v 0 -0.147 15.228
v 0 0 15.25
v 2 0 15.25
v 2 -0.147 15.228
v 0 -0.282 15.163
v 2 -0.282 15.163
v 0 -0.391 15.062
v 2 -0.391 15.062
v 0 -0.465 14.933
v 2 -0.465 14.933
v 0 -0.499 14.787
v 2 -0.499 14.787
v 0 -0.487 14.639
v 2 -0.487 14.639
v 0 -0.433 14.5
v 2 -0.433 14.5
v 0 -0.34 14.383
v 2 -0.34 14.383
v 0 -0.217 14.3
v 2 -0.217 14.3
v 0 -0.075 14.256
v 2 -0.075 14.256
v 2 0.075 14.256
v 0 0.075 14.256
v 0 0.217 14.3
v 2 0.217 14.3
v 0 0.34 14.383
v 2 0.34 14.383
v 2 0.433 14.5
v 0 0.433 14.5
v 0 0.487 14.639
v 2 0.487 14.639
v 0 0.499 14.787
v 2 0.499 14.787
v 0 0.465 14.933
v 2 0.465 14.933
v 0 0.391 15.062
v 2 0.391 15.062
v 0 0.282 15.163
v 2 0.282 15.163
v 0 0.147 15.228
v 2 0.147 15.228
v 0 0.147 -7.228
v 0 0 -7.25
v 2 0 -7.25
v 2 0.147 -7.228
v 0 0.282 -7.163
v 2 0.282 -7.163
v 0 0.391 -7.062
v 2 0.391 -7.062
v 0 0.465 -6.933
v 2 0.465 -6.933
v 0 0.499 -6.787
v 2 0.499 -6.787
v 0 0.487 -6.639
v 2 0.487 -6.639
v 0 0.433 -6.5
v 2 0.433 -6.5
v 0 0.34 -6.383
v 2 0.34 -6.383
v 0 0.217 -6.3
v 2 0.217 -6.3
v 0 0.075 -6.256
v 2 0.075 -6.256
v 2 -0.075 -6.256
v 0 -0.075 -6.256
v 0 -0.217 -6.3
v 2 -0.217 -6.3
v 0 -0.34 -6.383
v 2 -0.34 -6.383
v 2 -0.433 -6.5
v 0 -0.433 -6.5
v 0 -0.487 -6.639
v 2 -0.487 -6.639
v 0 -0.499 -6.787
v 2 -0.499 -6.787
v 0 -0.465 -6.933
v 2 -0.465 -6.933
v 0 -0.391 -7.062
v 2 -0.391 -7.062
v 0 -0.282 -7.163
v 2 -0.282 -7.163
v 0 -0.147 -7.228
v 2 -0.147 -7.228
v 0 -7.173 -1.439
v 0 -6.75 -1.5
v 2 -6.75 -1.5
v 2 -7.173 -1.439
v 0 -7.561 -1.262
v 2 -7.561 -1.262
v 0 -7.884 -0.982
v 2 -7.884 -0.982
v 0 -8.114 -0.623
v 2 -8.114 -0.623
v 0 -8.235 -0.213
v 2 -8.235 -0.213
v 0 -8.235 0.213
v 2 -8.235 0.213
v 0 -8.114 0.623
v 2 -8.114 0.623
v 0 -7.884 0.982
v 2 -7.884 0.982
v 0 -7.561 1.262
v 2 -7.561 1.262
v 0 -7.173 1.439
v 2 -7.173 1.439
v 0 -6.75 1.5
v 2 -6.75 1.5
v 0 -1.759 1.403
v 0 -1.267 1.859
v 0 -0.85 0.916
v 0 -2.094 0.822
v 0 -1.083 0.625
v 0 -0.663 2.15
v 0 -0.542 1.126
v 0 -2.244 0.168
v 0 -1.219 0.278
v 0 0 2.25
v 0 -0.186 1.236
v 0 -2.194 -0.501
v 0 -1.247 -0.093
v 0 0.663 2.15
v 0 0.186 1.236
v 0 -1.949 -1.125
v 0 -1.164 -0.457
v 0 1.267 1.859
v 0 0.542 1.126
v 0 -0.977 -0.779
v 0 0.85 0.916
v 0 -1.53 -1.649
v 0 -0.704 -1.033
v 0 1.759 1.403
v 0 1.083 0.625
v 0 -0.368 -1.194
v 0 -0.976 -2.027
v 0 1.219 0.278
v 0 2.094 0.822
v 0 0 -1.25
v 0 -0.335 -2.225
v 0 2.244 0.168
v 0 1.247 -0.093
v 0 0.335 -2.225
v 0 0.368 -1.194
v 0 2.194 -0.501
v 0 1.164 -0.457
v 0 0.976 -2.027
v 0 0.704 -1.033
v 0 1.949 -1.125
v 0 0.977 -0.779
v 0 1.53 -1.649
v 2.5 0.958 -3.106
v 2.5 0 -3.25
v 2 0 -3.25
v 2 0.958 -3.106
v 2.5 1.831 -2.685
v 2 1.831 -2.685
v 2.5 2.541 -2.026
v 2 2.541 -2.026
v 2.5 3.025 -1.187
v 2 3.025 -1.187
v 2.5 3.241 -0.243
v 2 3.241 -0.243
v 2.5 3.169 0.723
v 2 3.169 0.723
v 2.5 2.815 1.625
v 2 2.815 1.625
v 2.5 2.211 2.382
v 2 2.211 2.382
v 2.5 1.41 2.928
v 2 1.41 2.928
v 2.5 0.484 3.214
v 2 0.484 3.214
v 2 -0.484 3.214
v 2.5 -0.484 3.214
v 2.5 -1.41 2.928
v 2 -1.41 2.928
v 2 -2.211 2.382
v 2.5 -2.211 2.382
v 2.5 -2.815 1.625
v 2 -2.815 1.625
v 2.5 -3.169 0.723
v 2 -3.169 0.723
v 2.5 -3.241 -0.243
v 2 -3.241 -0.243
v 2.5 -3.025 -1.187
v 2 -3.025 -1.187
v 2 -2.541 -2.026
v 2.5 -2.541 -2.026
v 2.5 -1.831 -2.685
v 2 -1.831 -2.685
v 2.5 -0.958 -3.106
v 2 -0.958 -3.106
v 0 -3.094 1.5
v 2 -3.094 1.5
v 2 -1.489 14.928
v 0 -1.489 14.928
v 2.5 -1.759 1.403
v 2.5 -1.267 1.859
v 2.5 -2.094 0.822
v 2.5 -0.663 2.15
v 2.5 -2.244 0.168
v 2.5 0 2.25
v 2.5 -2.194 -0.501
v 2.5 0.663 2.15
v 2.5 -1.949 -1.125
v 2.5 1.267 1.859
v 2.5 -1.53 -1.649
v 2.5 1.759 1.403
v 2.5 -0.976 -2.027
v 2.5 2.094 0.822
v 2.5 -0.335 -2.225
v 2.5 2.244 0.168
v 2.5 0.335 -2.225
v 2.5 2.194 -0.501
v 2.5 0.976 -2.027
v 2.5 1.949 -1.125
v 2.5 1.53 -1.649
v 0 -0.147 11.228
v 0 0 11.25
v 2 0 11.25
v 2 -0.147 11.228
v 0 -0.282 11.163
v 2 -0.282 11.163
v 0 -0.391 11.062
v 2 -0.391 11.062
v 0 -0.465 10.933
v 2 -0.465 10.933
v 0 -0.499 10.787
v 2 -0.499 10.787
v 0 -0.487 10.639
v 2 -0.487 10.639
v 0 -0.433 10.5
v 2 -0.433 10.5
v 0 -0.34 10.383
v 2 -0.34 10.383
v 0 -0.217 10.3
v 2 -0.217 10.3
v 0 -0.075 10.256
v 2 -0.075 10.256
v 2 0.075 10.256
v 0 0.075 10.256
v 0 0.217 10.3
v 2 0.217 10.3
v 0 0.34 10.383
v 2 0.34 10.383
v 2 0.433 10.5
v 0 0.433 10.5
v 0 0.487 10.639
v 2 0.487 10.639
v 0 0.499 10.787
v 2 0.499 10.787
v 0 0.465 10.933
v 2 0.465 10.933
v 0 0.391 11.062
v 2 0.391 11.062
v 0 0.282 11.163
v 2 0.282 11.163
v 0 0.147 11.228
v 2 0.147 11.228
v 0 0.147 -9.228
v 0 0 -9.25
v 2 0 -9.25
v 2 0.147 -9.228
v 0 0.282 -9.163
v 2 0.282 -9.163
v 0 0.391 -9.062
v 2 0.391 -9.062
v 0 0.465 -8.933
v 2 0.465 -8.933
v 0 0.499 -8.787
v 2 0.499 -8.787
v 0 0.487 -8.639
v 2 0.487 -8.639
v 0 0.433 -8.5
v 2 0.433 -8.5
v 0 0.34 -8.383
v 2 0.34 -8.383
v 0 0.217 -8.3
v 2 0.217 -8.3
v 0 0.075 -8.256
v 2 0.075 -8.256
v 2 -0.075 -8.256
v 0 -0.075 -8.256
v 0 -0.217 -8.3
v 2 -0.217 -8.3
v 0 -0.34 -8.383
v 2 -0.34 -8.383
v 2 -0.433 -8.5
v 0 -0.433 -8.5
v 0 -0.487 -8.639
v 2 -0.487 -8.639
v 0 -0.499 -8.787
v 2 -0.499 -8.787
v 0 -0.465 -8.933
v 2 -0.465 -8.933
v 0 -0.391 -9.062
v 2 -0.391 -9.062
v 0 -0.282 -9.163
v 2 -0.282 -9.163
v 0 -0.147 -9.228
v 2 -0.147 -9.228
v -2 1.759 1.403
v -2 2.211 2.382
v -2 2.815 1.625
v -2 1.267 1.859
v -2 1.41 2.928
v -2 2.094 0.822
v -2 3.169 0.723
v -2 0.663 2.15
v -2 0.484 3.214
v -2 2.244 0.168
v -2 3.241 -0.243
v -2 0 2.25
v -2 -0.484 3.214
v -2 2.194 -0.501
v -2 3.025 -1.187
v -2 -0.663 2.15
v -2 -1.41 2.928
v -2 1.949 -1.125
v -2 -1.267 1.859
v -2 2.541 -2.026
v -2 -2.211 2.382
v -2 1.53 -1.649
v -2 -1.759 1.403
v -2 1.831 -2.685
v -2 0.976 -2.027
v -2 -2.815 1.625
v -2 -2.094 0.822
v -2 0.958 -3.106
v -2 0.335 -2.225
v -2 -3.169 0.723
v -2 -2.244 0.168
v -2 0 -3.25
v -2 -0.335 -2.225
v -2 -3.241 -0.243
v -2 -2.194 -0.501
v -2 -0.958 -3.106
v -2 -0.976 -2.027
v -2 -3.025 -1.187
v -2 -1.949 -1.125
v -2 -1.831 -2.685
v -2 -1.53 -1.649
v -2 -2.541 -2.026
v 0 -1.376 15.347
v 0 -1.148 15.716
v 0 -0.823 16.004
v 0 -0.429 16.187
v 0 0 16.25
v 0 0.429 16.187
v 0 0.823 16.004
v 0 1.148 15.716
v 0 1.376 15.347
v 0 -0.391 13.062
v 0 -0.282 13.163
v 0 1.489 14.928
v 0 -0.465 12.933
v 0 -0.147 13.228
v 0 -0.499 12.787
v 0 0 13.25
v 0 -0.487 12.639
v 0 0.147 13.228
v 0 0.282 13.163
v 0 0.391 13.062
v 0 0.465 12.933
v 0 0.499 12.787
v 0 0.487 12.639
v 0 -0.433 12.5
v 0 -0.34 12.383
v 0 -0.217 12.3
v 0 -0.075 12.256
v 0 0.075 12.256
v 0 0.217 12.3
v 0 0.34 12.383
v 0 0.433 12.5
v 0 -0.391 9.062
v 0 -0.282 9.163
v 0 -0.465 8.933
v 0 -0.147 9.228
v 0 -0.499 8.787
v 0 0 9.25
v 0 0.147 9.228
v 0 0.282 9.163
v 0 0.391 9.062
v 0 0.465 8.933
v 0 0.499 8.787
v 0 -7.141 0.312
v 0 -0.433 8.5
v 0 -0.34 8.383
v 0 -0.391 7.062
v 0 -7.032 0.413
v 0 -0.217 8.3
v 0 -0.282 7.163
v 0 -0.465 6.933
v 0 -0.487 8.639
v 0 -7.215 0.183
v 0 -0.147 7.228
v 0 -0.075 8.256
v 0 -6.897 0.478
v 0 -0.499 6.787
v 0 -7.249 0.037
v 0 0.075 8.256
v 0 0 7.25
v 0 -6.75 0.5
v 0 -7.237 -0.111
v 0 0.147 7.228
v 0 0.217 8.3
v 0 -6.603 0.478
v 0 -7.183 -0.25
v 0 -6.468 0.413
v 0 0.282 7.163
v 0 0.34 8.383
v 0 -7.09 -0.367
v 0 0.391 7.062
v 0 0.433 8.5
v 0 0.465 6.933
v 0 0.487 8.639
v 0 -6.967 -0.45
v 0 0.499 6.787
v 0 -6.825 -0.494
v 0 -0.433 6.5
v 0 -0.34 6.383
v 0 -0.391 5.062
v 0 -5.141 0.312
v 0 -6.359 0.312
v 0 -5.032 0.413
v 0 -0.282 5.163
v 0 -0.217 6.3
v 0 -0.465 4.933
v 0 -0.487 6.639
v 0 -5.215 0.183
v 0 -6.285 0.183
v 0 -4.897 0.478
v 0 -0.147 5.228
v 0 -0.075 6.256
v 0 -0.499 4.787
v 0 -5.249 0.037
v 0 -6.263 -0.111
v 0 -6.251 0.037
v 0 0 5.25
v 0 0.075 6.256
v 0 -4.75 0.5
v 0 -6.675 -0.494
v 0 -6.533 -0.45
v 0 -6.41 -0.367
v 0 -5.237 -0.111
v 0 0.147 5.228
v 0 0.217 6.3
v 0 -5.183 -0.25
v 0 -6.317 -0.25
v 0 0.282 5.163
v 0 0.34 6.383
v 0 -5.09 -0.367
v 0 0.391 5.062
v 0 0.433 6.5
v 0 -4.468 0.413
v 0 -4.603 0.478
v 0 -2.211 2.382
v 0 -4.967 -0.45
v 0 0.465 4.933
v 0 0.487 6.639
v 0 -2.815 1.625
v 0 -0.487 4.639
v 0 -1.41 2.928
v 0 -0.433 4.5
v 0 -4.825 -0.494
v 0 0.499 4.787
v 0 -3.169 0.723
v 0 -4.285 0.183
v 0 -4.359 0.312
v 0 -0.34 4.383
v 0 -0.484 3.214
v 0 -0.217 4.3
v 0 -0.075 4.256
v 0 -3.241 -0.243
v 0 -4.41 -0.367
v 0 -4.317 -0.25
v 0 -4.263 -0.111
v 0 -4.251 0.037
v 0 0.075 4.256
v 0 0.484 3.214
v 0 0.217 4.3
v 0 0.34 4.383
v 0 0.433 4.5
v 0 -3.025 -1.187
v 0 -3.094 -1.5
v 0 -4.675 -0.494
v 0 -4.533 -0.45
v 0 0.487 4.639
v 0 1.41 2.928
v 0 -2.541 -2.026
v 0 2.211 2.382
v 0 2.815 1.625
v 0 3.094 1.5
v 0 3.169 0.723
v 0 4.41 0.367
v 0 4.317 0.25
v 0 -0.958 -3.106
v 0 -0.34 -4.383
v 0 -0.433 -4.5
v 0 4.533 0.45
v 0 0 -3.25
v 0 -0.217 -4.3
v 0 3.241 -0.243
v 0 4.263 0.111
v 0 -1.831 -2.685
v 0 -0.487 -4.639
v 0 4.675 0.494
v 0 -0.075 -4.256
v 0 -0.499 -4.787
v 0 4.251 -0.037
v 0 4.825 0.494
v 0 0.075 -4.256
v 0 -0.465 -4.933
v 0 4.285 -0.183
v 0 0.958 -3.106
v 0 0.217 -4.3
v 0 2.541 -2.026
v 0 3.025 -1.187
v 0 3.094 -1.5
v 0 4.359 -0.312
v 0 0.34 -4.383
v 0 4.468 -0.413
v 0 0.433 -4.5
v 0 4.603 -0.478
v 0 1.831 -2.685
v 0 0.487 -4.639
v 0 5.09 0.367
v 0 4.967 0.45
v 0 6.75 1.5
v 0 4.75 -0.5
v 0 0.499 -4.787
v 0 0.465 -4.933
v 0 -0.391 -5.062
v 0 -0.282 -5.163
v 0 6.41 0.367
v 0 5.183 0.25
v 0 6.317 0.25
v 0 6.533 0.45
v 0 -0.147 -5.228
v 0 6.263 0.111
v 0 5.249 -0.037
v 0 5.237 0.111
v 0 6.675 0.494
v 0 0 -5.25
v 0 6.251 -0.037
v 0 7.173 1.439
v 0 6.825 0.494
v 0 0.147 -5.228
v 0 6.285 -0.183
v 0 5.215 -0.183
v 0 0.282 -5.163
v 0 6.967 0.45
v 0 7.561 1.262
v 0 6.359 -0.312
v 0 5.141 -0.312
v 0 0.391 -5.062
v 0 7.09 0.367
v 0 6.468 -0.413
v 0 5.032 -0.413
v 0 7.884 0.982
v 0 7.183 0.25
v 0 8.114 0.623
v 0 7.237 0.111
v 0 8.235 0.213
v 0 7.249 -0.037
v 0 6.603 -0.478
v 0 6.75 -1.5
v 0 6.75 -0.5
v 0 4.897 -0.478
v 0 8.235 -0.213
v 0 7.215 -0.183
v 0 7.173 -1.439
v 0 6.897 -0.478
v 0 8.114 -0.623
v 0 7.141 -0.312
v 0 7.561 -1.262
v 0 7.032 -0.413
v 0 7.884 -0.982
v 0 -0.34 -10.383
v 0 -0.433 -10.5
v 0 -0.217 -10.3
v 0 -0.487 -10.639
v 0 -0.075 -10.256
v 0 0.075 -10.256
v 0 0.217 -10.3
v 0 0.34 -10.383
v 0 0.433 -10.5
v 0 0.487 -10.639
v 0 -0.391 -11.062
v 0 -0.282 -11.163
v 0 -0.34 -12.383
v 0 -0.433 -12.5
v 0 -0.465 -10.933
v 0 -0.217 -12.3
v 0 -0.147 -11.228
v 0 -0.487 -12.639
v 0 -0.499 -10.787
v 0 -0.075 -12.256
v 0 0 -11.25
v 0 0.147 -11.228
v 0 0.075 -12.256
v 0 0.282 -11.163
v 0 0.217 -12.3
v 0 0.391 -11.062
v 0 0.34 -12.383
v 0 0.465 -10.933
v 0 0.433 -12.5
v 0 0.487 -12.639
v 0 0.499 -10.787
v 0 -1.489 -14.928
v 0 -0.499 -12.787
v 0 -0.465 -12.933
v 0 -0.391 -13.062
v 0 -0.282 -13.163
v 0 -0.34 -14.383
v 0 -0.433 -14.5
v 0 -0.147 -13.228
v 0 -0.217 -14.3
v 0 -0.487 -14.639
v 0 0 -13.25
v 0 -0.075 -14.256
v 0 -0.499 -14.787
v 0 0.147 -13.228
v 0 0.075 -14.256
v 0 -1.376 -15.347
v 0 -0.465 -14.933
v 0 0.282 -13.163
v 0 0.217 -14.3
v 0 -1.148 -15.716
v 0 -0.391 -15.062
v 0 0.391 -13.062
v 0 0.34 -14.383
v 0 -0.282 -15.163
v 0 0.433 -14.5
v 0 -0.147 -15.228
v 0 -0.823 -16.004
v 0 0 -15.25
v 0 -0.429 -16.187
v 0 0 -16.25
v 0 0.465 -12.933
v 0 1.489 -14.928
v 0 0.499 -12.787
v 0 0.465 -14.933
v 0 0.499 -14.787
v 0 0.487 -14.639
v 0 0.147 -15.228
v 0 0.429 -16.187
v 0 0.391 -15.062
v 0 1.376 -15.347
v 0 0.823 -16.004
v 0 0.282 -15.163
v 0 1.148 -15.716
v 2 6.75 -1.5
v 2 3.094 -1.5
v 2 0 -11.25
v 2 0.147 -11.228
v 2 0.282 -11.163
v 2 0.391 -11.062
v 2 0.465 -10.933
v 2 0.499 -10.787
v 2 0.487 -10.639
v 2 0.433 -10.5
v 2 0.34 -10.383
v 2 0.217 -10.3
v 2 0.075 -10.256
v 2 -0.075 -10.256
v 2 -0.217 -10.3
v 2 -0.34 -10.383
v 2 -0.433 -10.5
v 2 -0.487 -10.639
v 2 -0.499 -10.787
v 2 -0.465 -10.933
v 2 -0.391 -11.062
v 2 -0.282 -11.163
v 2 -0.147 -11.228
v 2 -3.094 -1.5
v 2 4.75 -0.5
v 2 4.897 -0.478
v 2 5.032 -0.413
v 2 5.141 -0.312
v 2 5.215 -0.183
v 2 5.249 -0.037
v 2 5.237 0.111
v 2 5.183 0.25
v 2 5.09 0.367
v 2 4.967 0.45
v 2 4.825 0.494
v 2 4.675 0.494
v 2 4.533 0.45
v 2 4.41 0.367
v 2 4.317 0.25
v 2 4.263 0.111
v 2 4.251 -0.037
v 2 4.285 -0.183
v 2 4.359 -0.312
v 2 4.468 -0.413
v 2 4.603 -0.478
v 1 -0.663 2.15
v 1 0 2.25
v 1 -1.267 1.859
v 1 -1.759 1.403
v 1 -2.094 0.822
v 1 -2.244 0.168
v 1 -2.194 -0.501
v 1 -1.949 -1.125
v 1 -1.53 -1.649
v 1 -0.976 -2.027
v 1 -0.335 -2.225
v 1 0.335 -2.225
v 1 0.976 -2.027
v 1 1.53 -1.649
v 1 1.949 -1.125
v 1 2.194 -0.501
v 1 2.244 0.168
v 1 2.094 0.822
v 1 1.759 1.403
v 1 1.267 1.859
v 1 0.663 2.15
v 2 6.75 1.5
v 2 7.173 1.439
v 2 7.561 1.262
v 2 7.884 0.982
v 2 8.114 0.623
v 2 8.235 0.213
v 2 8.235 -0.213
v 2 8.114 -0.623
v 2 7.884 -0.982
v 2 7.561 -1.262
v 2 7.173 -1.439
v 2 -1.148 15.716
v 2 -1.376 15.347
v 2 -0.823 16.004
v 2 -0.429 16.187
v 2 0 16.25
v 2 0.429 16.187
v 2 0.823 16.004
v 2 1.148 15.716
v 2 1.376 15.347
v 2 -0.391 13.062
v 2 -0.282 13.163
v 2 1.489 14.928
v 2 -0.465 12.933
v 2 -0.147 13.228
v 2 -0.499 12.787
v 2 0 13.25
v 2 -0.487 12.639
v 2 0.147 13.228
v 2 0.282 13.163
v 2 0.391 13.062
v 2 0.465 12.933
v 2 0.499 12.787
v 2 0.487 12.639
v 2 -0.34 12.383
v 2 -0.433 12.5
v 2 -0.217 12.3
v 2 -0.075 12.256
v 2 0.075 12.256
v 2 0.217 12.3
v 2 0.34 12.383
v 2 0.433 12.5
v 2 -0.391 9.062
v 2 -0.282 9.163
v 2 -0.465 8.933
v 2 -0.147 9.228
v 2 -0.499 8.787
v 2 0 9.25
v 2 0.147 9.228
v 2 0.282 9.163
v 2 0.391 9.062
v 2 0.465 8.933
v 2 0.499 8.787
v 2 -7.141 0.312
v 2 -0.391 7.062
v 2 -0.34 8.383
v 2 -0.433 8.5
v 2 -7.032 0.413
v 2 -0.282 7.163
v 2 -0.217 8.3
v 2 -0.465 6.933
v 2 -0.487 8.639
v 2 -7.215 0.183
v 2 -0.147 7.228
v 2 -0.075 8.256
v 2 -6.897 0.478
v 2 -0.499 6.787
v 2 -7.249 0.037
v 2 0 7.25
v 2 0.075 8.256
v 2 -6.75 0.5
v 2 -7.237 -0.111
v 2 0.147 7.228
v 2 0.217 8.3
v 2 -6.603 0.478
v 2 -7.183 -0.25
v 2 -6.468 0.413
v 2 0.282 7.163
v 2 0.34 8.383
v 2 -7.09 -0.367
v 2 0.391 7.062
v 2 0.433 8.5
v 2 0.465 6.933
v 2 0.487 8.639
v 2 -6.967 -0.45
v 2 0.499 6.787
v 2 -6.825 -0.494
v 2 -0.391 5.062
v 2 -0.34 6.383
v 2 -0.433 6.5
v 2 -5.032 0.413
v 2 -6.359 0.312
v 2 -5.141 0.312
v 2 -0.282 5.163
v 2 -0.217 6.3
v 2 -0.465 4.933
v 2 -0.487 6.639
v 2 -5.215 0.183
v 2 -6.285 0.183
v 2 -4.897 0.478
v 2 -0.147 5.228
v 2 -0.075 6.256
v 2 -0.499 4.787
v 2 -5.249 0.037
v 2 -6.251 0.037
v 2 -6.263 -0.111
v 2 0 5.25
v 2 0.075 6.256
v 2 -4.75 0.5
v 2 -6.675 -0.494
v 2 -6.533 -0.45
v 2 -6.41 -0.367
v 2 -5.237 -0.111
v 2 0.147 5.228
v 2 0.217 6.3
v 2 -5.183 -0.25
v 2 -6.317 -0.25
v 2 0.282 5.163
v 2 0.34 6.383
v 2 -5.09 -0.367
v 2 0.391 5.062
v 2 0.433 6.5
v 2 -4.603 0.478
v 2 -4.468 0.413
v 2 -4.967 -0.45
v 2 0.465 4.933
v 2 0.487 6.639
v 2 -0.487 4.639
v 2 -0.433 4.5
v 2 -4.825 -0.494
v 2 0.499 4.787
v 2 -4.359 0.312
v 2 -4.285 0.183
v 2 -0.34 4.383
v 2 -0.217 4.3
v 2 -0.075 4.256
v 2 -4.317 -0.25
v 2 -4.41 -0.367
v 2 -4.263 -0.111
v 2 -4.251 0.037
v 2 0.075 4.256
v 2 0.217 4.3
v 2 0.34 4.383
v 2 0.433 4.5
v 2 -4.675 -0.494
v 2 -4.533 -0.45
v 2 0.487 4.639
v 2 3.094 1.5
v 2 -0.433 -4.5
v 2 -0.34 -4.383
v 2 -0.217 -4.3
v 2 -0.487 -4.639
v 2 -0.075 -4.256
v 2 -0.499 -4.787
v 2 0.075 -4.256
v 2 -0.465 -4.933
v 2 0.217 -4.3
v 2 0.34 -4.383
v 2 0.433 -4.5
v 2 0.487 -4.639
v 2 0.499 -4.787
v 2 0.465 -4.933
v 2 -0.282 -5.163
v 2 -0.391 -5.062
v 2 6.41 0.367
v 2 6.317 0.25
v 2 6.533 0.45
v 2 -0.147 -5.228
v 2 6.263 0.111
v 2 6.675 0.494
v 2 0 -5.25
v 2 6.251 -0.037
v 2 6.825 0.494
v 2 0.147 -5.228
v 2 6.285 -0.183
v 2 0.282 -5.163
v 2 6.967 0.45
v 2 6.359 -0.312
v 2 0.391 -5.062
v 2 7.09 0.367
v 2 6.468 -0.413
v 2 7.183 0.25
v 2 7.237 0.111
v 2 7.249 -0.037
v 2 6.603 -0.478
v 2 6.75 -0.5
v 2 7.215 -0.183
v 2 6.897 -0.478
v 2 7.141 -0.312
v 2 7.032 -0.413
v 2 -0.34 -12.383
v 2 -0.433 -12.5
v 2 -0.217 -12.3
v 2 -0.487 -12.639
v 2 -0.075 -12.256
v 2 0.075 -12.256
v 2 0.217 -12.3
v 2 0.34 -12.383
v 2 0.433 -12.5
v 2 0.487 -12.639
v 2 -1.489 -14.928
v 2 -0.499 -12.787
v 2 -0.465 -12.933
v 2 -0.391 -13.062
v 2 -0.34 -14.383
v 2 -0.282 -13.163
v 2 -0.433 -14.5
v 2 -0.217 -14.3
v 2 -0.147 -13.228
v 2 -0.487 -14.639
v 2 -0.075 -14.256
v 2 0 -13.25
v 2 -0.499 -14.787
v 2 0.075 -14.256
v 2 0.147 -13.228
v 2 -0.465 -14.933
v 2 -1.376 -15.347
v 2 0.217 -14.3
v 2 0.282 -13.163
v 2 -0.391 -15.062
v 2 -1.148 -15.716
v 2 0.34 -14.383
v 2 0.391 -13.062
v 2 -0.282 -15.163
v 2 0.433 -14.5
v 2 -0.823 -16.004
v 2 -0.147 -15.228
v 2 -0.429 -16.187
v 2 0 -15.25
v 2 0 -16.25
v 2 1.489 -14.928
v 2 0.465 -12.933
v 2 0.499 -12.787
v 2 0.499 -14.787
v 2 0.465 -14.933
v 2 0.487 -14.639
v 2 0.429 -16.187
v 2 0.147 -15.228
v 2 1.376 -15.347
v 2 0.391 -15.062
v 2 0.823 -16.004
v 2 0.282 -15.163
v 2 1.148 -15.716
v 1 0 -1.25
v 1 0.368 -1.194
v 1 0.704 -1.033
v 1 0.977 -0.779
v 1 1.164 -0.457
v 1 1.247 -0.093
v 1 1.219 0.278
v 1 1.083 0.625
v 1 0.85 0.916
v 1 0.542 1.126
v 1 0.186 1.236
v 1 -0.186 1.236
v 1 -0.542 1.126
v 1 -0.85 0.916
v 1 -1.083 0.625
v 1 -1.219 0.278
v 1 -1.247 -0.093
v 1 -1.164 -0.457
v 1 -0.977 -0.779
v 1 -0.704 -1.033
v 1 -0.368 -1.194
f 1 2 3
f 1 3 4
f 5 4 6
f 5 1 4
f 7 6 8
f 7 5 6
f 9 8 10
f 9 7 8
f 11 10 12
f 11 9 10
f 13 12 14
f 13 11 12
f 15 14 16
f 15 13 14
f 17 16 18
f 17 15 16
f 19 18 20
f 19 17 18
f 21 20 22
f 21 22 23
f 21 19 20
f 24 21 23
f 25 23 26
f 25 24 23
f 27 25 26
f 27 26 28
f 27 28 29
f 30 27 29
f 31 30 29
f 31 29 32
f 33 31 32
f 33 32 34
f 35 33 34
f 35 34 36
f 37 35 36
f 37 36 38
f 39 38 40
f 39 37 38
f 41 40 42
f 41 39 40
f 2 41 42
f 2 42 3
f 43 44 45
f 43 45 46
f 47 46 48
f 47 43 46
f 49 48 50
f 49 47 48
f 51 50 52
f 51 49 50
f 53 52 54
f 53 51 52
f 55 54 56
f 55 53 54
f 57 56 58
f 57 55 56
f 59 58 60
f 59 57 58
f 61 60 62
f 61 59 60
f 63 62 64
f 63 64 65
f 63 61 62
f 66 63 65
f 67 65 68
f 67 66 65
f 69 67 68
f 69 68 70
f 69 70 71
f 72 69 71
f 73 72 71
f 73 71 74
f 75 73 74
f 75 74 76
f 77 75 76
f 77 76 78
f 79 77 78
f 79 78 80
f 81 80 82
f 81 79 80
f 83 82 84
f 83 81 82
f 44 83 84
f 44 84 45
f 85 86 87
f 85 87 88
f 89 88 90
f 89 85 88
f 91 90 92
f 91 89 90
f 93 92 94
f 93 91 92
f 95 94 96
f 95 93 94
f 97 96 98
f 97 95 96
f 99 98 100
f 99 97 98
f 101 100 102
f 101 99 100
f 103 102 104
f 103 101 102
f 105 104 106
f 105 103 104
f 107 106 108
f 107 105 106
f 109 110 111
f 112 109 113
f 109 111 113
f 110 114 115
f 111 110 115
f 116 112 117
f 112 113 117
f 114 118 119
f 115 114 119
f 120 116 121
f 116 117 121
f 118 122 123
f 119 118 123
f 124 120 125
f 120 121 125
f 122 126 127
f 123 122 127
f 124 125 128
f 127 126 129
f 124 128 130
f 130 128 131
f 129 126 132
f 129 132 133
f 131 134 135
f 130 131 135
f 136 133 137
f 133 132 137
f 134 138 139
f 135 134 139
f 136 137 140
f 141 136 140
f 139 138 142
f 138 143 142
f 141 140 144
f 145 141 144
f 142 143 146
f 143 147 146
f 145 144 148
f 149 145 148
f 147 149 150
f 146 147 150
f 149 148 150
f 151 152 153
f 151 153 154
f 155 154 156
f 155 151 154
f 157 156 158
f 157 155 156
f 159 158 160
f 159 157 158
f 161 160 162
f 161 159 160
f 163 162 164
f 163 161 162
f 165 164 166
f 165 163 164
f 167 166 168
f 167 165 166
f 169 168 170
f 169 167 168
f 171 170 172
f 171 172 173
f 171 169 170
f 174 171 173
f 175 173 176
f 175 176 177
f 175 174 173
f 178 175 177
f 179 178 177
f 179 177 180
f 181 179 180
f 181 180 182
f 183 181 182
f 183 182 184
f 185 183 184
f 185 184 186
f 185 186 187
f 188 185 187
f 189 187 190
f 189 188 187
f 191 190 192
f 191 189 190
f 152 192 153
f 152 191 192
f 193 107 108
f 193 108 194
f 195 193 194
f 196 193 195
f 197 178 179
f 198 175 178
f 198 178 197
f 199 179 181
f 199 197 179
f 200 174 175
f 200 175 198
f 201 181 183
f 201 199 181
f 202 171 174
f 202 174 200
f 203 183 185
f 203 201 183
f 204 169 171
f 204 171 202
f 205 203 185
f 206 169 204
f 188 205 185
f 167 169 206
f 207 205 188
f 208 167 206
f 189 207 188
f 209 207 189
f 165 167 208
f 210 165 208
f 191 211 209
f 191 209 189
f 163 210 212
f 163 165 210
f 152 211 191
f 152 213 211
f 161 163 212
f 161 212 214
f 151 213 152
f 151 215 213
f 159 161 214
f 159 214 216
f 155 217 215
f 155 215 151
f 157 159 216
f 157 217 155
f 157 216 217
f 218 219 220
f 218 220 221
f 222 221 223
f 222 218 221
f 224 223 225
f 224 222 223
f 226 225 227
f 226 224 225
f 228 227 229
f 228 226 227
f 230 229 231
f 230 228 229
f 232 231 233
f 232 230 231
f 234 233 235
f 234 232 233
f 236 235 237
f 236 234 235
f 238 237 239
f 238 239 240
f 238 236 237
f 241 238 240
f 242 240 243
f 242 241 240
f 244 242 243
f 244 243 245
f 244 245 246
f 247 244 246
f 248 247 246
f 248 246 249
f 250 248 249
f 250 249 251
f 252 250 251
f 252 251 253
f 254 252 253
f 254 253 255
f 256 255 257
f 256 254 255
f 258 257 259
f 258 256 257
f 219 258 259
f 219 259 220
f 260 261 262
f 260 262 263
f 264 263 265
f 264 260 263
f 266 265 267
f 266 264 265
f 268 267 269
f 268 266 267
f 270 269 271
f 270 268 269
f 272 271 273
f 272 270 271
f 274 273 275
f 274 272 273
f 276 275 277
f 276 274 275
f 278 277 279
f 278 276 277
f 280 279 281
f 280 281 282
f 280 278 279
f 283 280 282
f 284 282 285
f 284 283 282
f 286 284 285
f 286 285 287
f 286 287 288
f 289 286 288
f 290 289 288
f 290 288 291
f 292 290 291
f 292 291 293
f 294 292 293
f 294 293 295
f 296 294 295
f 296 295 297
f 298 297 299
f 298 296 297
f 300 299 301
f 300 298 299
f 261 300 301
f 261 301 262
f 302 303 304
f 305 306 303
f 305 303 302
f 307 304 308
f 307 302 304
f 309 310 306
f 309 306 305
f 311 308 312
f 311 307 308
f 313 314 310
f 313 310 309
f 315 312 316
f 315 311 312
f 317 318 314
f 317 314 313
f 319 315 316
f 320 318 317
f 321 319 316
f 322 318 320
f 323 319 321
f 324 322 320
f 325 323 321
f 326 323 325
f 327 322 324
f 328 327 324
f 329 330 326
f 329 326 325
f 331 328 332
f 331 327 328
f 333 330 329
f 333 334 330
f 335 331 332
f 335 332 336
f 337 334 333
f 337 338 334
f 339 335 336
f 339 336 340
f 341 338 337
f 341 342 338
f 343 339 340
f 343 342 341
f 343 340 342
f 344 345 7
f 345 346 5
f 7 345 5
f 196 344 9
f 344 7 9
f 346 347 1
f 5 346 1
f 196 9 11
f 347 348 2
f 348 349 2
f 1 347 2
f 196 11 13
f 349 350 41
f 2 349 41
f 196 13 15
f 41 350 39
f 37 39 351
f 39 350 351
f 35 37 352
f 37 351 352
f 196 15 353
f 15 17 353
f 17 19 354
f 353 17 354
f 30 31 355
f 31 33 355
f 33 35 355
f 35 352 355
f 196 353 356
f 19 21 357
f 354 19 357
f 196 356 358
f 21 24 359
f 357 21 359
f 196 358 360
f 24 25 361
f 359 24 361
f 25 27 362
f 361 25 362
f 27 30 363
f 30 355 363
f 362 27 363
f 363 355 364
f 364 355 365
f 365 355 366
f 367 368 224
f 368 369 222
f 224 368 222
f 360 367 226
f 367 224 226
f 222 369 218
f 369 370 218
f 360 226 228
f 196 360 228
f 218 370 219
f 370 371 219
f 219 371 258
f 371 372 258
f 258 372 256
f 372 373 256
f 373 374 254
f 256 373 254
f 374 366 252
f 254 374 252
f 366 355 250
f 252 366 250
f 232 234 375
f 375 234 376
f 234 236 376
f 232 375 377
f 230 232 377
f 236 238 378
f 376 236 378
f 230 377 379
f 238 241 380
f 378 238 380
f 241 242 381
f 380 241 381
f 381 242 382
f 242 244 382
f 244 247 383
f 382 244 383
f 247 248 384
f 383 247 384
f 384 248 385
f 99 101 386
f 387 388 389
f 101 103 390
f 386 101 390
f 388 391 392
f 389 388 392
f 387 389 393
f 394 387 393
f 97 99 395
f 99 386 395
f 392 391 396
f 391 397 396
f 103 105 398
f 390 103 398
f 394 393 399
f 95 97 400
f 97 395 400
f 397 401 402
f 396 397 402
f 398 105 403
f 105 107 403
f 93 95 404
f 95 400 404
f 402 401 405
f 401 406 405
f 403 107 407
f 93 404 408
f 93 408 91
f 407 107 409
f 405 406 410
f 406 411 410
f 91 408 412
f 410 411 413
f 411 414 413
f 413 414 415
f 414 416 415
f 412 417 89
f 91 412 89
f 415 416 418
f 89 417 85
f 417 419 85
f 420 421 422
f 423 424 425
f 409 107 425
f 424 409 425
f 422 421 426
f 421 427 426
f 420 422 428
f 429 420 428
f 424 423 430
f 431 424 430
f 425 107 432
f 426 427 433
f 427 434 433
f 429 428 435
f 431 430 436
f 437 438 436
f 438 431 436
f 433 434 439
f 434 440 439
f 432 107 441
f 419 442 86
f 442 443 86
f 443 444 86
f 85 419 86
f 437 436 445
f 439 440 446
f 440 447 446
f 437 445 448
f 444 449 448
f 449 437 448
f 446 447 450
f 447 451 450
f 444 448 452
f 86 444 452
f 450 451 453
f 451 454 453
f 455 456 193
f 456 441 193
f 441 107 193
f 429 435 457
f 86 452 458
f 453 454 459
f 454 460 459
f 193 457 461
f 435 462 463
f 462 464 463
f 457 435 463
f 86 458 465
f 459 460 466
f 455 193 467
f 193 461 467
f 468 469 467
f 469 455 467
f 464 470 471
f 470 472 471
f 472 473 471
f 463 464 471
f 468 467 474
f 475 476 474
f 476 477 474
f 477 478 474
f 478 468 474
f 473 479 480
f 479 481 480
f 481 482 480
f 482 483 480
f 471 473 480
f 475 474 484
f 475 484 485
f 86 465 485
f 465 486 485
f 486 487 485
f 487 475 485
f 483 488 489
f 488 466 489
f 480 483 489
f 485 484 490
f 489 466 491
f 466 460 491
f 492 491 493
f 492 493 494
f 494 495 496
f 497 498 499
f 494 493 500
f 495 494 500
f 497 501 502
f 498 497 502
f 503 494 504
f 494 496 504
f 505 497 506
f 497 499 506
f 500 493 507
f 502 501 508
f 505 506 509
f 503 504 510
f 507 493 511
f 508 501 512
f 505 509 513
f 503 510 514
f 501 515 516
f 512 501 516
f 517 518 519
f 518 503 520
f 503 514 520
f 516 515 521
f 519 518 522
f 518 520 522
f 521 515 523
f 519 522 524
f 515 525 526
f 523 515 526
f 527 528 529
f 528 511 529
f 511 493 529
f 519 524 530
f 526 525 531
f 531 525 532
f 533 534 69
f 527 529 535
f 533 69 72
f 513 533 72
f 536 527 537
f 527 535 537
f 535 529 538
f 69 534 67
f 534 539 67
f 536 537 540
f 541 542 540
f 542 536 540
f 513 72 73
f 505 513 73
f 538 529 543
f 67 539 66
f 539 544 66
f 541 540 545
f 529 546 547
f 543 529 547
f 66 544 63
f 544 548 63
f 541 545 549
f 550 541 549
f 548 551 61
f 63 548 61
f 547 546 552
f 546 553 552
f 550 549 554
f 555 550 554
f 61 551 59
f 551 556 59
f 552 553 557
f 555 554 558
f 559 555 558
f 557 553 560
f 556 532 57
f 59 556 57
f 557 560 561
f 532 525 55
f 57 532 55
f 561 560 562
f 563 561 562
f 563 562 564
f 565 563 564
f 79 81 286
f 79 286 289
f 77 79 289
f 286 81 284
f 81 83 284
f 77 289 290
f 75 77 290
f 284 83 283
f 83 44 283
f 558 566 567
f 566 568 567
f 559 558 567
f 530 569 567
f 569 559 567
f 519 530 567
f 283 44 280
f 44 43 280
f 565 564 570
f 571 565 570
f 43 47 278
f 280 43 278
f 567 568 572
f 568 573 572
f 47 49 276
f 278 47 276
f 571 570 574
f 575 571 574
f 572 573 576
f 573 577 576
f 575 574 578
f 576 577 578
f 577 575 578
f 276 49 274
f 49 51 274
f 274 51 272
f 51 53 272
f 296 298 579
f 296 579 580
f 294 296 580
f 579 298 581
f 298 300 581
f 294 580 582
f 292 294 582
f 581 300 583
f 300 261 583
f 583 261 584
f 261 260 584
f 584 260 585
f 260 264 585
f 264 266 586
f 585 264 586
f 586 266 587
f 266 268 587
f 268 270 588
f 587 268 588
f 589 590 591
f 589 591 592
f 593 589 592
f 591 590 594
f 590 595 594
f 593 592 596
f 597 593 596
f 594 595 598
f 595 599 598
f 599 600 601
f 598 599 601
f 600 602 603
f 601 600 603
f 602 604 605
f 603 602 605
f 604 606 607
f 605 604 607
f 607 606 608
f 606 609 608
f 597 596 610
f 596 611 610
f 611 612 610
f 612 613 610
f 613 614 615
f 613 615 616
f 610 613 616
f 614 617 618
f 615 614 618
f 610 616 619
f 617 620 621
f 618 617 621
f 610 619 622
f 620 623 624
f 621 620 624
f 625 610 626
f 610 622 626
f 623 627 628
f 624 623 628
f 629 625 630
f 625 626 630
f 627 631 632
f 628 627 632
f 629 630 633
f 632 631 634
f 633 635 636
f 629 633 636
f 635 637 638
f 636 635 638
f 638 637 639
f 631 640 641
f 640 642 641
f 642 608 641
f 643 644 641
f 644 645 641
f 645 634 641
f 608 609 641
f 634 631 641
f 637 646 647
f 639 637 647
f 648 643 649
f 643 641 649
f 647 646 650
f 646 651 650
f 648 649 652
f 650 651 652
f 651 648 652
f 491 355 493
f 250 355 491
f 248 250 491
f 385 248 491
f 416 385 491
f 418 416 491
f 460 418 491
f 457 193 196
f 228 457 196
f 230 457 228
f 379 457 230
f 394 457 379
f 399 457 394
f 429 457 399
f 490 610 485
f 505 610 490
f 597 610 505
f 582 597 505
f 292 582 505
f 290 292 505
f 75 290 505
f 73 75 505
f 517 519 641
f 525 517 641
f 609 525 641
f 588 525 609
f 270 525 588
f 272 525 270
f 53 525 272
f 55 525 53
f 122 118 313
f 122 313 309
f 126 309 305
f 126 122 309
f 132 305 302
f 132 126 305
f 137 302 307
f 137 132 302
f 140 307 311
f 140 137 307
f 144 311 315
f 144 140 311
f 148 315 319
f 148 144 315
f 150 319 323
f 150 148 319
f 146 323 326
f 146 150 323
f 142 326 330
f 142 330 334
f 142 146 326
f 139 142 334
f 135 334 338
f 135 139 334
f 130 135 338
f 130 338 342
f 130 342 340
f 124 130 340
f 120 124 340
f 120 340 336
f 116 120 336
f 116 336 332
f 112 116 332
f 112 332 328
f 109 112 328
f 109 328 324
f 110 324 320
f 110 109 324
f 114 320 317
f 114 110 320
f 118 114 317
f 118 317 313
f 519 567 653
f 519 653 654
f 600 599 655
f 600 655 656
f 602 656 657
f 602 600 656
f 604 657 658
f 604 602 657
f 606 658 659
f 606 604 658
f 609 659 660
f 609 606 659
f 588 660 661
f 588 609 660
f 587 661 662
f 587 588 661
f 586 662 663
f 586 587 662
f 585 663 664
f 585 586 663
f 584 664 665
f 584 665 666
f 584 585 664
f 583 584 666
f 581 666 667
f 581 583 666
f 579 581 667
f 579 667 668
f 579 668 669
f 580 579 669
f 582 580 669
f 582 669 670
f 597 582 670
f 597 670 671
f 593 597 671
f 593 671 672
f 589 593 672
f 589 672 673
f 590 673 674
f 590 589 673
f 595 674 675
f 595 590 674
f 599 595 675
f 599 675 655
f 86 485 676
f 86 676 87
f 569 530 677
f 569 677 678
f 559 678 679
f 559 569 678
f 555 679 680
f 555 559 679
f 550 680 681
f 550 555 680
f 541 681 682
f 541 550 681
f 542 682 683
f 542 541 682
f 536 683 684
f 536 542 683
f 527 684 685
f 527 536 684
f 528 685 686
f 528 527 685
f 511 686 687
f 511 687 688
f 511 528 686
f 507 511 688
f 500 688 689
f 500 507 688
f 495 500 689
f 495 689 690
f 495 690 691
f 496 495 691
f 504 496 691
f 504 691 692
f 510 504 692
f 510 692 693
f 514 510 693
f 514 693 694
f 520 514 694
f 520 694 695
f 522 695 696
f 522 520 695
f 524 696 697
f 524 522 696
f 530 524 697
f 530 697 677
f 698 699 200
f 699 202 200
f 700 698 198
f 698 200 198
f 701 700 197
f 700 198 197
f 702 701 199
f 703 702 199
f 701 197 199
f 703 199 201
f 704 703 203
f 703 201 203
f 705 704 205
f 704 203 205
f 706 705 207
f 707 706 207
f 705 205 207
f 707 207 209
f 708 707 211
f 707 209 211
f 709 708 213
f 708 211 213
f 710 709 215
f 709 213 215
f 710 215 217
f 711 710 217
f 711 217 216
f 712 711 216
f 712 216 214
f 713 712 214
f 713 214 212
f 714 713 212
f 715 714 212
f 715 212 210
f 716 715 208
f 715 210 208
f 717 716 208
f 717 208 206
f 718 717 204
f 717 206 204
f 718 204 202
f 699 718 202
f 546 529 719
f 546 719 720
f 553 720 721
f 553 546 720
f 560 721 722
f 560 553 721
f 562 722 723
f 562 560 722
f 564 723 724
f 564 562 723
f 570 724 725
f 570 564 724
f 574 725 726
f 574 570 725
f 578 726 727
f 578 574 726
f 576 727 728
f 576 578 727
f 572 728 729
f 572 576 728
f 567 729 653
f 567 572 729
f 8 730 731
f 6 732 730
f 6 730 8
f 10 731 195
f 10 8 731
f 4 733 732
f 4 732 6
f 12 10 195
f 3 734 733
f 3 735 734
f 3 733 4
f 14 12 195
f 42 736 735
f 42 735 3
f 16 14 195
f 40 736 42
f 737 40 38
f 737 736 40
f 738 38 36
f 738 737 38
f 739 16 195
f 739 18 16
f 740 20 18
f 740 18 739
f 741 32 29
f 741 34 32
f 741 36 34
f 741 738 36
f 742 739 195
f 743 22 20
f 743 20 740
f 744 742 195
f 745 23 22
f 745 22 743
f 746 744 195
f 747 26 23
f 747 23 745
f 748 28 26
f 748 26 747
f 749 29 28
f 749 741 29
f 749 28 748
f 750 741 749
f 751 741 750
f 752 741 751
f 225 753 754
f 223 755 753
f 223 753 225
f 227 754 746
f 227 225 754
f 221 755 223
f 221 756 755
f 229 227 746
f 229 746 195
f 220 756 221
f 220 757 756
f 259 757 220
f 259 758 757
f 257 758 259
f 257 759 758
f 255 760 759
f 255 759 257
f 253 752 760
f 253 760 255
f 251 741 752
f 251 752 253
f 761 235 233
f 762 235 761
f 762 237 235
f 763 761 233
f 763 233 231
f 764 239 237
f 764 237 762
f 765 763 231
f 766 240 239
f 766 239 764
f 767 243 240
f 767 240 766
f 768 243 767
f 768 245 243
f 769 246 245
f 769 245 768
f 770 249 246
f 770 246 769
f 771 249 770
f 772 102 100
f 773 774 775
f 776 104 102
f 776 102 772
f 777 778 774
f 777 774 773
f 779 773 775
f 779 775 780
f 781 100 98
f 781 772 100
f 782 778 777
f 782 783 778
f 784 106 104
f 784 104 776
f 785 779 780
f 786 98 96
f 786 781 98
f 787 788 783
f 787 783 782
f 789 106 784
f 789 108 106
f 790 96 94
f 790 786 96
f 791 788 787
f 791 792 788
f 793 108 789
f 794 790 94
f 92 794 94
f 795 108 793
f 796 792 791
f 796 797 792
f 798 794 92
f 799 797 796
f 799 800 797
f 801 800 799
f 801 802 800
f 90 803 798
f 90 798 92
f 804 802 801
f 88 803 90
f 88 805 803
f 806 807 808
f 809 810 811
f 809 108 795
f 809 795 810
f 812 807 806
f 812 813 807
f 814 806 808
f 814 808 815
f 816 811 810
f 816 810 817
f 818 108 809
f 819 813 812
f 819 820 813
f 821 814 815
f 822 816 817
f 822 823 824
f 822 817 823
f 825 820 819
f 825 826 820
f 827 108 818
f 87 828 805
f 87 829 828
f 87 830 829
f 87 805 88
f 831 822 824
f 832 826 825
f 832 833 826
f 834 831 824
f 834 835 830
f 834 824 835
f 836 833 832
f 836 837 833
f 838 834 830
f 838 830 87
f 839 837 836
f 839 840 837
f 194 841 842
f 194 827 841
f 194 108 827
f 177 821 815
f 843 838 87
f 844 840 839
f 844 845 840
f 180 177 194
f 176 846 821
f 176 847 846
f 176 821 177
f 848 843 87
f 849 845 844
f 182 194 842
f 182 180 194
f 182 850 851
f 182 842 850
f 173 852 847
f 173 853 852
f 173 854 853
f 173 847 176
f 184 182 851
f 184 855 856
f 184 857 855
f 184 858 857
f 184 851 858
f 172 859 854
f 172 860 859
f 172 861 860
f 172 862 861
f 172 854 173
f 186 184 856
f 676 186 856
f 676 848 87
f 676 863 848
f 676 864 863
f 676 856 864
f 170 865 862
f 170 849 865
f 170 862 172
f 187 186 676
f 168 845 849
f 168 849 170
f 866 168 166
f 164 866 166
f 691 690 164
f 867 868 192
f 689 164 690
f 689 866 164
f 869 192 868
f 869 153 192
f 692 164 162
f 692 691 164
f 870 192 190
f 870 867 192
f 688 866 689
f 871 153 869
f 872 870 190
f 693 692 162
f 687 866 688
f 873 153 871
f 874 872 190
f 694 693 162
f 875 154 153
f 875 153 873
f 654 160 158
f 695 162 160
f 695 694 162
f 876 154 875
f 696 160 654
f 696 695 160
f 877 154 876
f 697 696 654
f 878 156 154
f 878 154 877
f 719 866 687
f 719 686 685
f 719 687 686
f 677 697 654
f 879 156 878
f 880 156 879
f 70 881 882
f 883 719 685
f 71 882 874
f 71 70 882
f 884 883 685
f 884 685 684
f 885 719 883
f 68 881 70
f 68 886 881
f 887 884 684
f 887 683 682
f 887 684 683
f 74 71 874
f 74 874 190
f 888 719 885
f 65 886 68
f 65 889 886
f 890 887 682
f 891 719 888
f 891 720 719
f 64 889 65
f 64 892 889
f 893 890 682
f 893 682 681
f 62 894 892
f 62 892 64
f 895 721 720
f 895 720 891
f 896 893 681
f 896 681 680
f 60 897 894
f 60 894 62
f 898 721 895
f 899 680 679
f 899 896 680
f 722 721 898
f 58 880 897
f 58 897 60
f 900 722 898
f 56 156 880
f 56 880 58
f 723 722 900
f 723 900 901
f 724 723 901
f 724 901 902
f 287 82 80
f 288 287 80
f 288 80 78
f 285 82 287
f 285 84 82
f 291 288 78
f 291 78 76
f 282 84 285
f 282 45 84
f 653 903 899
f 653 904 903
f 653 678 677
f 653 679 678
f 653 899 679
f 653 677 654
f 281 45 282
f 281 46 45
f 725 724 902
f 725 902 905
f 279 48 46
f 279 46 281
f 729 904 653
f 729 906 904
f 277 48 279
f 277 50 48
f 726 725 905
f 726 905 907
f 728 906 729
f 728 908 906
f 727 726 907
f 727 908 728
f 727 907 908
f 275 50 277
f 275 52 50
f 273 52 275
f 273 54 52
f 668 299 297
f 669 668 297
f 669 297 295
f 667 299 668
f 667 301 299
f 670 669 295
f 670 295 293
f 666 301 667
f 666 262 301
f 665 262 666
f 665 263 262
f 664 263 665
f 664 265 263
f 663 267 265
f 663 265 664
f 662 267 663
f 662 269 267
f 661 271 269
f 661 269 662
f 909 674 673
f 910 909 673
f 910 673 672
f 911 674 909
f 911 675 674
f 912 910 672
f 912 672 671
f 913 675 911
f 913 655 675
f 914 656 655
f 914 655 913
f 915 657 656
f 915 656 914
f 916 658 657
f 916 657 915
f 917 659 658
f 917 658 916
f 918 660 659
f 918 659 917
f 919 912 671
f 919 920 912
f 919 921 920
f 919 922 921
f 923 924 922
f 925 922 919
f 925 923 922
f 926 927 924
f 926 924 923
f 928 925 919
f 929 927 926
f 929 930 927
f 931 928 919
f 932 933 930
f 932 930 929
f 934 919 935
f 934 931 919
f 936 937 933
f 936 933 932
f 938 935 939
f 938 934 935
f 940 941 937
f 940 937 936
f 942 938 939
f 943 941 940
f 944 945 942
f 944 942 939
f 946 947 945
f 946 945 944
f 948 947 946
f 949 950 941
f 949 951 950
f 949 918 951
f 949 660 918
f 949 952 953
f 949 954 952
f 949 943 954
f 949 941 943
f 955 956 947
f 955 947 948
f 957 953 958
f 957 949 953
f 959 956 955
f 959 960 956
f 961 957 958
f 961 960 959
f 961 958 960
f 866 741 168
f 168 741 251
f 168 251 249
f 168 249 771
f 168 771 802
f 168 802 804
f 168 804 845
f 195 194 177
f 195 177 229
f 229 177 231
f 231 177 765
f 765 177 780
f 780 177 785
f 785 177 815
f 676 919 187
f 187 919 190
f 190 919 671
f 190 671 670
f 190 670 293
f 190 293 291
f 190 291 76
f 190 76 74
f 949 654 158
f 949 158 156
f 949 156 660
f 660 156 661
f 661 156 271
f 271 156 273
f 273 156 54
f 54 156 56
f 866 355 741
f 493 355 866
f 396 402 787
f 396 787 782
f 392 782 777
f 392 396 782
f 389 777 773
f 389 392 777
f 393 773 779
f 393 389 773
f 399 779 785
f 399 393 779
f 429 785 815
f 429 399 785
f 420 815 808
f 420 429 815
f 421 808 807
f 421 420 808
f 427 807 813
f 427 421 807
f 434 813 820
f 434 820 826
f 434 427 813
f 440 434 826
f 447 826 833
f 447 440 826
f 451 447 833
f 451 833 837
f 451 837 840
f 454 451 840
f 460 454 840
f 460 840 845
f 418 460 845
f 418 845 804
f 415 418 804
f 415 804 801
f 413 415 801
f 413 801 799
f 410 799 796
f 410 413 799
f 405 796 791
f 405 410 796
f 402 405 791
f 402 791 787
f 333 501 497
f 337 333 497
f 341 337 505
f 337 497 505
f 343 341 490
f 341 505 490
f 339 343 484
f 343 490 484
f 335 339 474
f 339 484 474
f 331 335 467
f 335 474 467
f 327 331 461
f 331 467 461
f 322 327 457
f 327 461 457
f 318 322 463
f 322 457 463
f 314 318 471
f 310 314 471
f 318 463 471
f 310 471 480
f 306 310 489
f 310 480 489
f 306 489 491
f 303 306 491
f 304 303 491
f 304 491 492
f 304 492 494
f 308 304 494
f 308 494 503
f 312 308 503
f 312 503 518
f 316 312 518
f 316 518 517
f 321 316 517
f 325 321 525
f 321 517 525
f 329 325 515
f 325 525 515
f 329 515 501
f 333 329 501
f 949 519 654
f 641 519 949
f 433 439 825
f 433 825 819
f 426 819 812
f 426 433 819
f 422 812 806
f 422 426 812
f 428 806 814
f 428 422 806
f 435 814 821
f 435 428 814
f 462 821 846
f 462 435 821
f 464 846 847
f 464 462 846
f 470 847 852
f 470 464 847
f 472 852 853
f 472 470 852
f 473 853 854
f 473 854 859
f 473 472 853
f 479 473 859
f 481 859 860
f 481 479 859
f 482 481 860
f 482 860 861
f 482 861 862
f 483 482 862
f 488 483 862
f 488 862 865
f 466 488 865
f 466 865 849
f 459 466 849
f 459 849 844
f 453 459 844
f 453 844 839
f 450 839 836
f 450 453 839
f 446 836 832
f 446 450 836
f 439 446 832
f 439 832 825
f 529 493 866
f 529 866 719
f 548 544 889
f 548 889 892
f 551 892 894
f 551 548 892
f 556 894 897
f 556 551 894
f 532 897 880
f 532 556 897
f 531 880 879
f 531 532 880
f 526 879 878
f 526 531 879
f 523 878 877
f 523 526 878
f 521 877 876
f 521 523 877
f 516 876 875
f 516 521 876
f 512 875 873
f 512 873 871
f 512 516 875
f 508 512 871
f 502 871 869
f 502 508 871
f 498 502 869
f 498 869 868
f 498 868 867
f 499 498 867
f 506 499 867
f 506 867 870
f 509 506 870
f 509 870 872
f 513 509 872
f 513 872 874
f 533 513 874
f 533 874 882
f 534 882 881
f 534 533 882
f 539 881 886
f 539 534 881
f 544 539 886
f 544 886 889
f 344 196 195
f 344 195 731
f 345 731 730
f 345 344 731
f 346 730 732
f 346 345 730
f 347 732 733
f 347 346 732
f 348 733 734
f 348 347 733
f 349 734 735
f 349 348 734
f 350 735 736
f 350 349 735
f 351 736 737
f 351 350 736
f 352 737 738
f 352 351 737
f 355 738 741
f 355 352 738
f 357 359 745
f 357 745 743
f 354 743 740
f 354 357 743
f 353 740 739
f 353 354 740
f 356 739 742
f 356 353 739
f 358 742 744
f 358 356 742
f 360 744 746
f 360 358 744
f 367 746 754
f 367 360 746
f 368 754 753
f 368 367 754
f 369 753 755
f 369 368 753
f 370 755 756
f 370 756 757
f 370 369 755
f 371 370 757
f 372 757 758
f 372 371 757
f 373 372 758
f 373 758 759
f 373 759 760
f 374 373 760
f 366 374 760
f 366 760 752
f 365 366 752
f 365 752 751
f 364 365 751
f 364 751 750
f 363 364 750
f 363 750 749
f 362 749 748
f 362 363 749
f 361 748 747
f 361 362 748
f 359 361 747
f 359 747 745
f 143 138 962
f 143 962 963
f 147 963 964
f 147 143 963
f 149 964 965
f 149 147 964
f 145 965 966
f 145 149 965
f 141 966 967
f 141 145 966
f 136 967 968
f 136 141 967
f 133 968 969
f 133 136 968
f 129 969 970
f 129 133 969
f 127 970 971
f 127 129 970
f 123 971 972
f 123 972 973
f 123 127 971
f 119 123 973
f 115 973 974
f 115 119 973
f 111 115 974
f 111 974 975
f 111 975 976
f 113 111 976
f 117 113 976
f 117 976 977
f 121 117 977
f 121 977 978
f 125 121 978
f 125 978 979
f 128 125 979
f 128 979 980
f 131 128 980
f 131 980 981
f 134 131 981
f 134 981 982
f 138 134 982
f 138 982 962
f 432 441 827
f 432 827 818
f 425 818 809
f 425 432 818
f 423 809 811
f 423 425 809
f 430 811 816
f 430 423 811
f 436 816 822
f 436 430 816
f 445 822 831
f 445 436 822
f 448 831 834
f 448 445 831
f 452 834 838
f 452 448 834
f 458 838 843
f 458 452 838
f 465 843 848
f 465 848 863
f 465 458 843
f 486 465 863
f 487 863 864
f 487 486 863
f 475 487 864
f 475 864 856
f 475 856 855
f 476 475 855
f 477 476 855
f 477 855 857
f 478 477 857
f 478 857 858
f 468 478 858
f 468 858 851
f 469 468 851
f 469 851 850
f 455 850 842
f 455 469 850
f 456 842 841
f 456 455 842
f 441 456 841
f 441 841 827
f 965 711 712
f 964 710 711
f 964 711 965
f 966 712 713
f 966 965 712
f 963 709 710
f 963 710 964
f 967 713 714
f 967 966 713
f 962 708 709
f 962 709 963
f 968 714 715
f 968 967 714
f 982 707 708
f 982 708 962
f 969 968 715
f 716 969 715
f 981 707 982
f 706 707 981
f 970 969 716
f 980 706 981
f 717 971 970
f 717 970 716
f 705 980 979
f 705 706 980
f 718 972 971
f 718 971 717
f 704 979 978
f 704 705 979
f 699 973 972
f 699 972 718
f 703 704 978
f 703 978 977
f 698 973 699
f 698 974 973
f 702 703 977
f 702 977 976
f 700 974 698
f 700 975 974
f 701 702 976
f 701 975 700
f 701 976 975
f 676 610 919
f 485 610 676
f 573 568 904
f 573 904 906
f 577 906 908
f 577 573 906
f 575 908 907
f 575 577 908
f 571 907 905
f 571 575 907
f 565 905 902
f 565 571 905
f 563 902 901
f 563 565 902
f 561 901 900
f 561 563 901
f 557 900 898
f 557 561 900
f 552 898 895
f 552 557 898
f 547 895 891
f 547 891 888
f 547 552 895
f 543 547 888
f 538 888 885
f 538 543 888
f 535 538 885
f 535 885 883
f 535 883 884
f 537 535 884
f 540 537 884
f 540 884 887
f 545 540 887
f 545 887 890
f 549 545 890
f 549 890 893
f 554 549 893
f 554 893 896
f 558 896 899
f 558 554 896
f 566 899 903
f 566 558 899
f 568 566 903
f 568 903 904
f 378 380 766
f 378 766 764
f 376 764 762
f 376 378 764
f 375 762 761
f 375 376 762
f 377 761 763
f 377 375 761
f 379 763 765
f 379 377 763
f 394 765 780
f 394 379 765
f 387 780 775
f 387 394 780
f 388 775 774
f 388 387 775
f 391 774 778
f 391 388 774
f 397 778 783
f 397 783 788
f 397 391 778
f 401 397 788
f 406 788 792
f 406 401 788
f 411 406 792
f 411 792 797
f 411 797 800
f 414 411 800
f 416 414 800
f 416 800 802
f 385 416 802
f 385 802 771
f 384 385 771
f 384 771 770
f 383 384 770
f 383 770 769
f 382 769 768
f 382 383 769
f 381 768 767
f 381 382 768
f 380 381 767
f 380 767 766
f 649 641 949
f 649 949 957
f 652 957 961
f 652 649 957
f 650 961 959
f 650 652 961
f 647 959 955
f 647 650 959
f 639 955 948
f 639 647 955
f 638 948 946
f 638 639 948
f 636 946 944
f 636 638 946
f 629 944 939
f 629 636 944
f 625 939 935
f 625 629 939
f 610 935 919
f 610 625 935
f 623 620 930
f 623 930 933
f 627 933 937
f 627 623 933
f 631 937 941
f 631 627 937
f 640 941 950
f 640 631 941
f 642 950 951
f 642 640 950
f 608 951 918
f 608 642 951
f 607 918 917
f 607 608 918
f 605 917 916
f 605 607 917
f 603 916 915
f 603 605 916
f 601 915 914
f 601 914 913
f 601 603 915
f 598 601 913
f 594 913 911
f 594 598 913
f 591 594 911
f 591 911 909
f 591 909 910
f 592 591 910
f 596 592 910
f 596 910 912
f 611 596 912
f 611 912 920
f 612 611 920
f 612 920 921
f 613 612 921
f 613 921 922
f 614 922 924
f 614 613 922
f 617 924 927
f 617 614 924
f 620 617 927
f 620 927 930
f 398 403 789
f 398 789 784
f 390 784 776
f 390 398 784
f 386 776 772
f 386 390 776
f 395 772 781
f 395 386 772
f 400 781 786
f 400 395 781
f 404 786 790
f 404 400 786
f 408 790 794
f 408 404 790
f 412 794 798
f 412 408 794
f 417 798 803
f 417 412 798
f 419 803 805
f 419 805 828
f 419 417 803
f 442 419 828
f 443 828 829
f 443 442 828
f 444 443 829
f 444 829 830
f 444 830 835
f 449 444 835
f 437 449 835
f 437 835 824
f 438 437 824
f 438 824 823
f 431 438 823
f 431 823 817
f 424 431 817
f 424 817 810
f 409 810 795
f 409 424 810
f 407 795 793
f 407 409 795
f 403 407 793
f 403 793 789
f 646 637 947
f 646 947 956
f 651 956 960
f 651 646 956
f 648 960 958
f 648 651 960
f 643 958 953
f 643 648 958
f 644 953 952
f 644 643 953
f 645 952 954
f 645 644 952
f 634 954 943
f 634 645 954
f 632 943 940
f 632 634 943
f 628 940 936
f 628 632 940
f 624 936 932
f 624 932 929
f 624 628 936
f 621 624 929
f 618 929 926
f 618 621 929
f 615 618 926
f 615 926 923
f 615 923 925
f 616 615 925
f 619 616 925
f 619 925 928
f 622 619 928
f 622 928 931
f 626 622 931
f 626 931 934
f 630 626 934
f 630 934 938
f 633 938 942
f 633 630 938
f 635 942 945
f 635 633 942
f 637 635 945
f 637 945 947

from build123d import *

# Parameters (mm, degrees)
SKETCH_1_R          = 3.25
SKETCH_1_R_2        = 0.5
EXTRUDE_1_DEPTH     = 2
EXTRUDE_START       = -2
SKETCH_2_R          = 3.25
SKETCH_2_R_2        = 1.25
EXTRUDE_2_DEPTH     = 2
SKETCH_3_R          = 3.25
SKETCH_3_R_2        = 2.25
EXTRUDE_3_DEPTH     = 2
EXTRUDE_START_2     = 0.5
SKETCH_4_R          = 3.25
SKETCH_4_R_2        = 2.25
EXTRUDE_5_DEPTH     = 0.5
SKETCH_5_R          = 2.25
SKETCH_5_R_2        = 1.25
CUT_EXTRUDE_1_DEPTH = 1


with BuildPart() as part:
    # 草图1 → 凸台-拉伸1 (new body)
    with BuildSketch(Plane(origin=(0, 0, 0), x_dir=(0, 0, -1), z_dir=(1, 0, 0))):
        with BuildLine():
            Line((-14.927966102, 1.489405273), (-1.5, 3.093886487))
            Line((-1.5, 3.093886487), (-1.5, 6.75))
            ThreePointArc((-1.5, 6.75), (0, 8.25), (1.5, 6.75))
            Line((1.5, 6.75), (1.5, 3.093886487))
            Line((1.5, 3.093886487), (14.927966102, 1.489405273))
            ThreePointArc((14.927966102, 1.489405273), (16.25, 0), (14.927966102, -1.489405273))
            Line((14.927966102, -1.489405273), (1.5, -3.093886487))
            Line((1.5, -3.093886487), (1.5, -6.75))
            ThreePointArc((1.5, -6.75), (0, -8.25), (-1.5, -6.75))
            Line((-1.5, -6.75), (-1.5, -3.093886487))
            Line((-1.5, -3.093886487), (-14.927966102, -1.489405273))
            ThreePointArc((-14.927966102, -1.489405273), (-16.25, 0), (-14.927966102, 1.489405273))
        make_face()
        Circle(SKETCH_1_R, mode=Mode.SUBTRACT)
        with Locations((4.75, 0)):
            Circle(SKETCH_1_R_2, mode=Mode.SUBTRACT)
        with Locations((6.75, 0)):
            Circle(SKETCH_1_R_2, mode=Mode.SUBTRACT)
        with Locations((8.75, 0)):
            Circle(SKETCH_1_R_2, mode=Mode.SUBTRACT)
        with Locations((10.75, 0)):
            Circle(SKETCH_1_R_2, mode=Mode.SUBTRACT)
        with Locations((12.75, 0)):
            Circle(SKETCH_1_R_2, mode=Mode.SUBTRACT)
        with Locations((14.75, 0)):
            Circle(SKETCH_1_R_2, mode=Mode.SUBTRACT)
        with Locations(Location((-14.75, 0, 0), (0, 0, 180))):
            Circle(SKETCH_1_R_2, mode=Mode.SUBTRACT)
        with Locations(Location((-12.75, 0, 0), (0, 0, 180))):
            Circle(SKETCH_1_R_2, mode=Mode.SUBTRACT)
        with Locations(Location((-10.75, 0, 0), (0, 0, 180))):
            Circle(SKETCH_1_R_2, mode=Mode.SUBTRACT)
        with Locations(Location((-8.75, 0, 0), (0, 0, 180))):
            Circle(SKETCH_1_R_2, mode=Mode.SUBTRACT)
        with Locations(Location((-6.75, 0, 0), (0, 0, 180))):
            Circle(SKETCH_1_R_2, mode=Mode.SUBTRACT)
        with Locations(Location((-4.75, 0, 0), (0, 0, 180))):
            Circle(SKETCH_1_R_2, mode=Mode.SUBTRACT)
        with Locations((0, 4.75)):
            Circle(SKETCH_1_R_2, mode=Mode.SUBTRACT)
        with Locations((0, 6.75)):
            Circle(SKETCH_1_R_2, mode=Mode.SUBTRACT)
        with Locations(Location((0, -4.75, 0), (0, 0, 180))):
            Circle(SKETCH_1_R_2, mode=Mode.SUBTRACT)
        with Locations(Location((0, -6.75, 0), (0, 0, 180))):
            Circle(SKETCH_1_R_2, mode=Mode.SUBTRACT)
    extrude(amount=EXTRUDE_1_DEPTH)

    # 草图2 → 凸台-拉伸2 (add)
    with BuildSketch(Plane(origin=(2, 0, 0), x_dir=(0, 0, -1), z_dir=(1, 0, 0)).offset(EXTRUDE_START)):
        Circle(SKETCH_2_R)
        Circle(SKETCH_2_R_2, mode=Mode.SUBTRACT)
    extrude(amount=EXTRUDE_2_DEPTH)

    # 草图3 → 凸台-拉伸3 (add)
    with BuildSketch(Plane.ZY):
        with Locations(Location((0, 0, 0), (0, 0, 180))):
            Circle(SKETCH_3_R)
        Circle(SKETCH_3_R_2, mode=Mode.SUBTRACT)
    extrude(amount=EXTRUDE_3_DEPTH)

    # 草图4 → 凸台-拉伸5 (add)
    with BuildSketch(Plane(origin=(2, 0, 0), x_dir=(0, 0, -1), z_dir=(1, 0, 0)).offset(EXTRUDE_START_2)):
        Circle(SKETCH_4_R)
        with Locations(Location((0, 0, 0), (0, 0, 180))):
            Circle(SKETCH_4_R_2, mode=Mode.SUBTRACT)
    extrude(amount=-EXTRUDE_5_DEPTH)

    # 草图5 → 切除-拉伸1 (cut)
    with BuildSketch(Plane(origin=(2, 0, 0), x_dir=(0, 0, -1), z_dir=(1, 0, 0))):
        with Locations(Location((0, 0, 0), (0, 0, 180))):
            Circle(SKETCH_5_R)
        Circle(SKETCH_5_R_2, mode=Mode.SUBTRACT)
    extrude(amount=-CUT_EXTRUDE_1_DEPTH, mode=Mode.SUBTRACT)


solid = part.part
